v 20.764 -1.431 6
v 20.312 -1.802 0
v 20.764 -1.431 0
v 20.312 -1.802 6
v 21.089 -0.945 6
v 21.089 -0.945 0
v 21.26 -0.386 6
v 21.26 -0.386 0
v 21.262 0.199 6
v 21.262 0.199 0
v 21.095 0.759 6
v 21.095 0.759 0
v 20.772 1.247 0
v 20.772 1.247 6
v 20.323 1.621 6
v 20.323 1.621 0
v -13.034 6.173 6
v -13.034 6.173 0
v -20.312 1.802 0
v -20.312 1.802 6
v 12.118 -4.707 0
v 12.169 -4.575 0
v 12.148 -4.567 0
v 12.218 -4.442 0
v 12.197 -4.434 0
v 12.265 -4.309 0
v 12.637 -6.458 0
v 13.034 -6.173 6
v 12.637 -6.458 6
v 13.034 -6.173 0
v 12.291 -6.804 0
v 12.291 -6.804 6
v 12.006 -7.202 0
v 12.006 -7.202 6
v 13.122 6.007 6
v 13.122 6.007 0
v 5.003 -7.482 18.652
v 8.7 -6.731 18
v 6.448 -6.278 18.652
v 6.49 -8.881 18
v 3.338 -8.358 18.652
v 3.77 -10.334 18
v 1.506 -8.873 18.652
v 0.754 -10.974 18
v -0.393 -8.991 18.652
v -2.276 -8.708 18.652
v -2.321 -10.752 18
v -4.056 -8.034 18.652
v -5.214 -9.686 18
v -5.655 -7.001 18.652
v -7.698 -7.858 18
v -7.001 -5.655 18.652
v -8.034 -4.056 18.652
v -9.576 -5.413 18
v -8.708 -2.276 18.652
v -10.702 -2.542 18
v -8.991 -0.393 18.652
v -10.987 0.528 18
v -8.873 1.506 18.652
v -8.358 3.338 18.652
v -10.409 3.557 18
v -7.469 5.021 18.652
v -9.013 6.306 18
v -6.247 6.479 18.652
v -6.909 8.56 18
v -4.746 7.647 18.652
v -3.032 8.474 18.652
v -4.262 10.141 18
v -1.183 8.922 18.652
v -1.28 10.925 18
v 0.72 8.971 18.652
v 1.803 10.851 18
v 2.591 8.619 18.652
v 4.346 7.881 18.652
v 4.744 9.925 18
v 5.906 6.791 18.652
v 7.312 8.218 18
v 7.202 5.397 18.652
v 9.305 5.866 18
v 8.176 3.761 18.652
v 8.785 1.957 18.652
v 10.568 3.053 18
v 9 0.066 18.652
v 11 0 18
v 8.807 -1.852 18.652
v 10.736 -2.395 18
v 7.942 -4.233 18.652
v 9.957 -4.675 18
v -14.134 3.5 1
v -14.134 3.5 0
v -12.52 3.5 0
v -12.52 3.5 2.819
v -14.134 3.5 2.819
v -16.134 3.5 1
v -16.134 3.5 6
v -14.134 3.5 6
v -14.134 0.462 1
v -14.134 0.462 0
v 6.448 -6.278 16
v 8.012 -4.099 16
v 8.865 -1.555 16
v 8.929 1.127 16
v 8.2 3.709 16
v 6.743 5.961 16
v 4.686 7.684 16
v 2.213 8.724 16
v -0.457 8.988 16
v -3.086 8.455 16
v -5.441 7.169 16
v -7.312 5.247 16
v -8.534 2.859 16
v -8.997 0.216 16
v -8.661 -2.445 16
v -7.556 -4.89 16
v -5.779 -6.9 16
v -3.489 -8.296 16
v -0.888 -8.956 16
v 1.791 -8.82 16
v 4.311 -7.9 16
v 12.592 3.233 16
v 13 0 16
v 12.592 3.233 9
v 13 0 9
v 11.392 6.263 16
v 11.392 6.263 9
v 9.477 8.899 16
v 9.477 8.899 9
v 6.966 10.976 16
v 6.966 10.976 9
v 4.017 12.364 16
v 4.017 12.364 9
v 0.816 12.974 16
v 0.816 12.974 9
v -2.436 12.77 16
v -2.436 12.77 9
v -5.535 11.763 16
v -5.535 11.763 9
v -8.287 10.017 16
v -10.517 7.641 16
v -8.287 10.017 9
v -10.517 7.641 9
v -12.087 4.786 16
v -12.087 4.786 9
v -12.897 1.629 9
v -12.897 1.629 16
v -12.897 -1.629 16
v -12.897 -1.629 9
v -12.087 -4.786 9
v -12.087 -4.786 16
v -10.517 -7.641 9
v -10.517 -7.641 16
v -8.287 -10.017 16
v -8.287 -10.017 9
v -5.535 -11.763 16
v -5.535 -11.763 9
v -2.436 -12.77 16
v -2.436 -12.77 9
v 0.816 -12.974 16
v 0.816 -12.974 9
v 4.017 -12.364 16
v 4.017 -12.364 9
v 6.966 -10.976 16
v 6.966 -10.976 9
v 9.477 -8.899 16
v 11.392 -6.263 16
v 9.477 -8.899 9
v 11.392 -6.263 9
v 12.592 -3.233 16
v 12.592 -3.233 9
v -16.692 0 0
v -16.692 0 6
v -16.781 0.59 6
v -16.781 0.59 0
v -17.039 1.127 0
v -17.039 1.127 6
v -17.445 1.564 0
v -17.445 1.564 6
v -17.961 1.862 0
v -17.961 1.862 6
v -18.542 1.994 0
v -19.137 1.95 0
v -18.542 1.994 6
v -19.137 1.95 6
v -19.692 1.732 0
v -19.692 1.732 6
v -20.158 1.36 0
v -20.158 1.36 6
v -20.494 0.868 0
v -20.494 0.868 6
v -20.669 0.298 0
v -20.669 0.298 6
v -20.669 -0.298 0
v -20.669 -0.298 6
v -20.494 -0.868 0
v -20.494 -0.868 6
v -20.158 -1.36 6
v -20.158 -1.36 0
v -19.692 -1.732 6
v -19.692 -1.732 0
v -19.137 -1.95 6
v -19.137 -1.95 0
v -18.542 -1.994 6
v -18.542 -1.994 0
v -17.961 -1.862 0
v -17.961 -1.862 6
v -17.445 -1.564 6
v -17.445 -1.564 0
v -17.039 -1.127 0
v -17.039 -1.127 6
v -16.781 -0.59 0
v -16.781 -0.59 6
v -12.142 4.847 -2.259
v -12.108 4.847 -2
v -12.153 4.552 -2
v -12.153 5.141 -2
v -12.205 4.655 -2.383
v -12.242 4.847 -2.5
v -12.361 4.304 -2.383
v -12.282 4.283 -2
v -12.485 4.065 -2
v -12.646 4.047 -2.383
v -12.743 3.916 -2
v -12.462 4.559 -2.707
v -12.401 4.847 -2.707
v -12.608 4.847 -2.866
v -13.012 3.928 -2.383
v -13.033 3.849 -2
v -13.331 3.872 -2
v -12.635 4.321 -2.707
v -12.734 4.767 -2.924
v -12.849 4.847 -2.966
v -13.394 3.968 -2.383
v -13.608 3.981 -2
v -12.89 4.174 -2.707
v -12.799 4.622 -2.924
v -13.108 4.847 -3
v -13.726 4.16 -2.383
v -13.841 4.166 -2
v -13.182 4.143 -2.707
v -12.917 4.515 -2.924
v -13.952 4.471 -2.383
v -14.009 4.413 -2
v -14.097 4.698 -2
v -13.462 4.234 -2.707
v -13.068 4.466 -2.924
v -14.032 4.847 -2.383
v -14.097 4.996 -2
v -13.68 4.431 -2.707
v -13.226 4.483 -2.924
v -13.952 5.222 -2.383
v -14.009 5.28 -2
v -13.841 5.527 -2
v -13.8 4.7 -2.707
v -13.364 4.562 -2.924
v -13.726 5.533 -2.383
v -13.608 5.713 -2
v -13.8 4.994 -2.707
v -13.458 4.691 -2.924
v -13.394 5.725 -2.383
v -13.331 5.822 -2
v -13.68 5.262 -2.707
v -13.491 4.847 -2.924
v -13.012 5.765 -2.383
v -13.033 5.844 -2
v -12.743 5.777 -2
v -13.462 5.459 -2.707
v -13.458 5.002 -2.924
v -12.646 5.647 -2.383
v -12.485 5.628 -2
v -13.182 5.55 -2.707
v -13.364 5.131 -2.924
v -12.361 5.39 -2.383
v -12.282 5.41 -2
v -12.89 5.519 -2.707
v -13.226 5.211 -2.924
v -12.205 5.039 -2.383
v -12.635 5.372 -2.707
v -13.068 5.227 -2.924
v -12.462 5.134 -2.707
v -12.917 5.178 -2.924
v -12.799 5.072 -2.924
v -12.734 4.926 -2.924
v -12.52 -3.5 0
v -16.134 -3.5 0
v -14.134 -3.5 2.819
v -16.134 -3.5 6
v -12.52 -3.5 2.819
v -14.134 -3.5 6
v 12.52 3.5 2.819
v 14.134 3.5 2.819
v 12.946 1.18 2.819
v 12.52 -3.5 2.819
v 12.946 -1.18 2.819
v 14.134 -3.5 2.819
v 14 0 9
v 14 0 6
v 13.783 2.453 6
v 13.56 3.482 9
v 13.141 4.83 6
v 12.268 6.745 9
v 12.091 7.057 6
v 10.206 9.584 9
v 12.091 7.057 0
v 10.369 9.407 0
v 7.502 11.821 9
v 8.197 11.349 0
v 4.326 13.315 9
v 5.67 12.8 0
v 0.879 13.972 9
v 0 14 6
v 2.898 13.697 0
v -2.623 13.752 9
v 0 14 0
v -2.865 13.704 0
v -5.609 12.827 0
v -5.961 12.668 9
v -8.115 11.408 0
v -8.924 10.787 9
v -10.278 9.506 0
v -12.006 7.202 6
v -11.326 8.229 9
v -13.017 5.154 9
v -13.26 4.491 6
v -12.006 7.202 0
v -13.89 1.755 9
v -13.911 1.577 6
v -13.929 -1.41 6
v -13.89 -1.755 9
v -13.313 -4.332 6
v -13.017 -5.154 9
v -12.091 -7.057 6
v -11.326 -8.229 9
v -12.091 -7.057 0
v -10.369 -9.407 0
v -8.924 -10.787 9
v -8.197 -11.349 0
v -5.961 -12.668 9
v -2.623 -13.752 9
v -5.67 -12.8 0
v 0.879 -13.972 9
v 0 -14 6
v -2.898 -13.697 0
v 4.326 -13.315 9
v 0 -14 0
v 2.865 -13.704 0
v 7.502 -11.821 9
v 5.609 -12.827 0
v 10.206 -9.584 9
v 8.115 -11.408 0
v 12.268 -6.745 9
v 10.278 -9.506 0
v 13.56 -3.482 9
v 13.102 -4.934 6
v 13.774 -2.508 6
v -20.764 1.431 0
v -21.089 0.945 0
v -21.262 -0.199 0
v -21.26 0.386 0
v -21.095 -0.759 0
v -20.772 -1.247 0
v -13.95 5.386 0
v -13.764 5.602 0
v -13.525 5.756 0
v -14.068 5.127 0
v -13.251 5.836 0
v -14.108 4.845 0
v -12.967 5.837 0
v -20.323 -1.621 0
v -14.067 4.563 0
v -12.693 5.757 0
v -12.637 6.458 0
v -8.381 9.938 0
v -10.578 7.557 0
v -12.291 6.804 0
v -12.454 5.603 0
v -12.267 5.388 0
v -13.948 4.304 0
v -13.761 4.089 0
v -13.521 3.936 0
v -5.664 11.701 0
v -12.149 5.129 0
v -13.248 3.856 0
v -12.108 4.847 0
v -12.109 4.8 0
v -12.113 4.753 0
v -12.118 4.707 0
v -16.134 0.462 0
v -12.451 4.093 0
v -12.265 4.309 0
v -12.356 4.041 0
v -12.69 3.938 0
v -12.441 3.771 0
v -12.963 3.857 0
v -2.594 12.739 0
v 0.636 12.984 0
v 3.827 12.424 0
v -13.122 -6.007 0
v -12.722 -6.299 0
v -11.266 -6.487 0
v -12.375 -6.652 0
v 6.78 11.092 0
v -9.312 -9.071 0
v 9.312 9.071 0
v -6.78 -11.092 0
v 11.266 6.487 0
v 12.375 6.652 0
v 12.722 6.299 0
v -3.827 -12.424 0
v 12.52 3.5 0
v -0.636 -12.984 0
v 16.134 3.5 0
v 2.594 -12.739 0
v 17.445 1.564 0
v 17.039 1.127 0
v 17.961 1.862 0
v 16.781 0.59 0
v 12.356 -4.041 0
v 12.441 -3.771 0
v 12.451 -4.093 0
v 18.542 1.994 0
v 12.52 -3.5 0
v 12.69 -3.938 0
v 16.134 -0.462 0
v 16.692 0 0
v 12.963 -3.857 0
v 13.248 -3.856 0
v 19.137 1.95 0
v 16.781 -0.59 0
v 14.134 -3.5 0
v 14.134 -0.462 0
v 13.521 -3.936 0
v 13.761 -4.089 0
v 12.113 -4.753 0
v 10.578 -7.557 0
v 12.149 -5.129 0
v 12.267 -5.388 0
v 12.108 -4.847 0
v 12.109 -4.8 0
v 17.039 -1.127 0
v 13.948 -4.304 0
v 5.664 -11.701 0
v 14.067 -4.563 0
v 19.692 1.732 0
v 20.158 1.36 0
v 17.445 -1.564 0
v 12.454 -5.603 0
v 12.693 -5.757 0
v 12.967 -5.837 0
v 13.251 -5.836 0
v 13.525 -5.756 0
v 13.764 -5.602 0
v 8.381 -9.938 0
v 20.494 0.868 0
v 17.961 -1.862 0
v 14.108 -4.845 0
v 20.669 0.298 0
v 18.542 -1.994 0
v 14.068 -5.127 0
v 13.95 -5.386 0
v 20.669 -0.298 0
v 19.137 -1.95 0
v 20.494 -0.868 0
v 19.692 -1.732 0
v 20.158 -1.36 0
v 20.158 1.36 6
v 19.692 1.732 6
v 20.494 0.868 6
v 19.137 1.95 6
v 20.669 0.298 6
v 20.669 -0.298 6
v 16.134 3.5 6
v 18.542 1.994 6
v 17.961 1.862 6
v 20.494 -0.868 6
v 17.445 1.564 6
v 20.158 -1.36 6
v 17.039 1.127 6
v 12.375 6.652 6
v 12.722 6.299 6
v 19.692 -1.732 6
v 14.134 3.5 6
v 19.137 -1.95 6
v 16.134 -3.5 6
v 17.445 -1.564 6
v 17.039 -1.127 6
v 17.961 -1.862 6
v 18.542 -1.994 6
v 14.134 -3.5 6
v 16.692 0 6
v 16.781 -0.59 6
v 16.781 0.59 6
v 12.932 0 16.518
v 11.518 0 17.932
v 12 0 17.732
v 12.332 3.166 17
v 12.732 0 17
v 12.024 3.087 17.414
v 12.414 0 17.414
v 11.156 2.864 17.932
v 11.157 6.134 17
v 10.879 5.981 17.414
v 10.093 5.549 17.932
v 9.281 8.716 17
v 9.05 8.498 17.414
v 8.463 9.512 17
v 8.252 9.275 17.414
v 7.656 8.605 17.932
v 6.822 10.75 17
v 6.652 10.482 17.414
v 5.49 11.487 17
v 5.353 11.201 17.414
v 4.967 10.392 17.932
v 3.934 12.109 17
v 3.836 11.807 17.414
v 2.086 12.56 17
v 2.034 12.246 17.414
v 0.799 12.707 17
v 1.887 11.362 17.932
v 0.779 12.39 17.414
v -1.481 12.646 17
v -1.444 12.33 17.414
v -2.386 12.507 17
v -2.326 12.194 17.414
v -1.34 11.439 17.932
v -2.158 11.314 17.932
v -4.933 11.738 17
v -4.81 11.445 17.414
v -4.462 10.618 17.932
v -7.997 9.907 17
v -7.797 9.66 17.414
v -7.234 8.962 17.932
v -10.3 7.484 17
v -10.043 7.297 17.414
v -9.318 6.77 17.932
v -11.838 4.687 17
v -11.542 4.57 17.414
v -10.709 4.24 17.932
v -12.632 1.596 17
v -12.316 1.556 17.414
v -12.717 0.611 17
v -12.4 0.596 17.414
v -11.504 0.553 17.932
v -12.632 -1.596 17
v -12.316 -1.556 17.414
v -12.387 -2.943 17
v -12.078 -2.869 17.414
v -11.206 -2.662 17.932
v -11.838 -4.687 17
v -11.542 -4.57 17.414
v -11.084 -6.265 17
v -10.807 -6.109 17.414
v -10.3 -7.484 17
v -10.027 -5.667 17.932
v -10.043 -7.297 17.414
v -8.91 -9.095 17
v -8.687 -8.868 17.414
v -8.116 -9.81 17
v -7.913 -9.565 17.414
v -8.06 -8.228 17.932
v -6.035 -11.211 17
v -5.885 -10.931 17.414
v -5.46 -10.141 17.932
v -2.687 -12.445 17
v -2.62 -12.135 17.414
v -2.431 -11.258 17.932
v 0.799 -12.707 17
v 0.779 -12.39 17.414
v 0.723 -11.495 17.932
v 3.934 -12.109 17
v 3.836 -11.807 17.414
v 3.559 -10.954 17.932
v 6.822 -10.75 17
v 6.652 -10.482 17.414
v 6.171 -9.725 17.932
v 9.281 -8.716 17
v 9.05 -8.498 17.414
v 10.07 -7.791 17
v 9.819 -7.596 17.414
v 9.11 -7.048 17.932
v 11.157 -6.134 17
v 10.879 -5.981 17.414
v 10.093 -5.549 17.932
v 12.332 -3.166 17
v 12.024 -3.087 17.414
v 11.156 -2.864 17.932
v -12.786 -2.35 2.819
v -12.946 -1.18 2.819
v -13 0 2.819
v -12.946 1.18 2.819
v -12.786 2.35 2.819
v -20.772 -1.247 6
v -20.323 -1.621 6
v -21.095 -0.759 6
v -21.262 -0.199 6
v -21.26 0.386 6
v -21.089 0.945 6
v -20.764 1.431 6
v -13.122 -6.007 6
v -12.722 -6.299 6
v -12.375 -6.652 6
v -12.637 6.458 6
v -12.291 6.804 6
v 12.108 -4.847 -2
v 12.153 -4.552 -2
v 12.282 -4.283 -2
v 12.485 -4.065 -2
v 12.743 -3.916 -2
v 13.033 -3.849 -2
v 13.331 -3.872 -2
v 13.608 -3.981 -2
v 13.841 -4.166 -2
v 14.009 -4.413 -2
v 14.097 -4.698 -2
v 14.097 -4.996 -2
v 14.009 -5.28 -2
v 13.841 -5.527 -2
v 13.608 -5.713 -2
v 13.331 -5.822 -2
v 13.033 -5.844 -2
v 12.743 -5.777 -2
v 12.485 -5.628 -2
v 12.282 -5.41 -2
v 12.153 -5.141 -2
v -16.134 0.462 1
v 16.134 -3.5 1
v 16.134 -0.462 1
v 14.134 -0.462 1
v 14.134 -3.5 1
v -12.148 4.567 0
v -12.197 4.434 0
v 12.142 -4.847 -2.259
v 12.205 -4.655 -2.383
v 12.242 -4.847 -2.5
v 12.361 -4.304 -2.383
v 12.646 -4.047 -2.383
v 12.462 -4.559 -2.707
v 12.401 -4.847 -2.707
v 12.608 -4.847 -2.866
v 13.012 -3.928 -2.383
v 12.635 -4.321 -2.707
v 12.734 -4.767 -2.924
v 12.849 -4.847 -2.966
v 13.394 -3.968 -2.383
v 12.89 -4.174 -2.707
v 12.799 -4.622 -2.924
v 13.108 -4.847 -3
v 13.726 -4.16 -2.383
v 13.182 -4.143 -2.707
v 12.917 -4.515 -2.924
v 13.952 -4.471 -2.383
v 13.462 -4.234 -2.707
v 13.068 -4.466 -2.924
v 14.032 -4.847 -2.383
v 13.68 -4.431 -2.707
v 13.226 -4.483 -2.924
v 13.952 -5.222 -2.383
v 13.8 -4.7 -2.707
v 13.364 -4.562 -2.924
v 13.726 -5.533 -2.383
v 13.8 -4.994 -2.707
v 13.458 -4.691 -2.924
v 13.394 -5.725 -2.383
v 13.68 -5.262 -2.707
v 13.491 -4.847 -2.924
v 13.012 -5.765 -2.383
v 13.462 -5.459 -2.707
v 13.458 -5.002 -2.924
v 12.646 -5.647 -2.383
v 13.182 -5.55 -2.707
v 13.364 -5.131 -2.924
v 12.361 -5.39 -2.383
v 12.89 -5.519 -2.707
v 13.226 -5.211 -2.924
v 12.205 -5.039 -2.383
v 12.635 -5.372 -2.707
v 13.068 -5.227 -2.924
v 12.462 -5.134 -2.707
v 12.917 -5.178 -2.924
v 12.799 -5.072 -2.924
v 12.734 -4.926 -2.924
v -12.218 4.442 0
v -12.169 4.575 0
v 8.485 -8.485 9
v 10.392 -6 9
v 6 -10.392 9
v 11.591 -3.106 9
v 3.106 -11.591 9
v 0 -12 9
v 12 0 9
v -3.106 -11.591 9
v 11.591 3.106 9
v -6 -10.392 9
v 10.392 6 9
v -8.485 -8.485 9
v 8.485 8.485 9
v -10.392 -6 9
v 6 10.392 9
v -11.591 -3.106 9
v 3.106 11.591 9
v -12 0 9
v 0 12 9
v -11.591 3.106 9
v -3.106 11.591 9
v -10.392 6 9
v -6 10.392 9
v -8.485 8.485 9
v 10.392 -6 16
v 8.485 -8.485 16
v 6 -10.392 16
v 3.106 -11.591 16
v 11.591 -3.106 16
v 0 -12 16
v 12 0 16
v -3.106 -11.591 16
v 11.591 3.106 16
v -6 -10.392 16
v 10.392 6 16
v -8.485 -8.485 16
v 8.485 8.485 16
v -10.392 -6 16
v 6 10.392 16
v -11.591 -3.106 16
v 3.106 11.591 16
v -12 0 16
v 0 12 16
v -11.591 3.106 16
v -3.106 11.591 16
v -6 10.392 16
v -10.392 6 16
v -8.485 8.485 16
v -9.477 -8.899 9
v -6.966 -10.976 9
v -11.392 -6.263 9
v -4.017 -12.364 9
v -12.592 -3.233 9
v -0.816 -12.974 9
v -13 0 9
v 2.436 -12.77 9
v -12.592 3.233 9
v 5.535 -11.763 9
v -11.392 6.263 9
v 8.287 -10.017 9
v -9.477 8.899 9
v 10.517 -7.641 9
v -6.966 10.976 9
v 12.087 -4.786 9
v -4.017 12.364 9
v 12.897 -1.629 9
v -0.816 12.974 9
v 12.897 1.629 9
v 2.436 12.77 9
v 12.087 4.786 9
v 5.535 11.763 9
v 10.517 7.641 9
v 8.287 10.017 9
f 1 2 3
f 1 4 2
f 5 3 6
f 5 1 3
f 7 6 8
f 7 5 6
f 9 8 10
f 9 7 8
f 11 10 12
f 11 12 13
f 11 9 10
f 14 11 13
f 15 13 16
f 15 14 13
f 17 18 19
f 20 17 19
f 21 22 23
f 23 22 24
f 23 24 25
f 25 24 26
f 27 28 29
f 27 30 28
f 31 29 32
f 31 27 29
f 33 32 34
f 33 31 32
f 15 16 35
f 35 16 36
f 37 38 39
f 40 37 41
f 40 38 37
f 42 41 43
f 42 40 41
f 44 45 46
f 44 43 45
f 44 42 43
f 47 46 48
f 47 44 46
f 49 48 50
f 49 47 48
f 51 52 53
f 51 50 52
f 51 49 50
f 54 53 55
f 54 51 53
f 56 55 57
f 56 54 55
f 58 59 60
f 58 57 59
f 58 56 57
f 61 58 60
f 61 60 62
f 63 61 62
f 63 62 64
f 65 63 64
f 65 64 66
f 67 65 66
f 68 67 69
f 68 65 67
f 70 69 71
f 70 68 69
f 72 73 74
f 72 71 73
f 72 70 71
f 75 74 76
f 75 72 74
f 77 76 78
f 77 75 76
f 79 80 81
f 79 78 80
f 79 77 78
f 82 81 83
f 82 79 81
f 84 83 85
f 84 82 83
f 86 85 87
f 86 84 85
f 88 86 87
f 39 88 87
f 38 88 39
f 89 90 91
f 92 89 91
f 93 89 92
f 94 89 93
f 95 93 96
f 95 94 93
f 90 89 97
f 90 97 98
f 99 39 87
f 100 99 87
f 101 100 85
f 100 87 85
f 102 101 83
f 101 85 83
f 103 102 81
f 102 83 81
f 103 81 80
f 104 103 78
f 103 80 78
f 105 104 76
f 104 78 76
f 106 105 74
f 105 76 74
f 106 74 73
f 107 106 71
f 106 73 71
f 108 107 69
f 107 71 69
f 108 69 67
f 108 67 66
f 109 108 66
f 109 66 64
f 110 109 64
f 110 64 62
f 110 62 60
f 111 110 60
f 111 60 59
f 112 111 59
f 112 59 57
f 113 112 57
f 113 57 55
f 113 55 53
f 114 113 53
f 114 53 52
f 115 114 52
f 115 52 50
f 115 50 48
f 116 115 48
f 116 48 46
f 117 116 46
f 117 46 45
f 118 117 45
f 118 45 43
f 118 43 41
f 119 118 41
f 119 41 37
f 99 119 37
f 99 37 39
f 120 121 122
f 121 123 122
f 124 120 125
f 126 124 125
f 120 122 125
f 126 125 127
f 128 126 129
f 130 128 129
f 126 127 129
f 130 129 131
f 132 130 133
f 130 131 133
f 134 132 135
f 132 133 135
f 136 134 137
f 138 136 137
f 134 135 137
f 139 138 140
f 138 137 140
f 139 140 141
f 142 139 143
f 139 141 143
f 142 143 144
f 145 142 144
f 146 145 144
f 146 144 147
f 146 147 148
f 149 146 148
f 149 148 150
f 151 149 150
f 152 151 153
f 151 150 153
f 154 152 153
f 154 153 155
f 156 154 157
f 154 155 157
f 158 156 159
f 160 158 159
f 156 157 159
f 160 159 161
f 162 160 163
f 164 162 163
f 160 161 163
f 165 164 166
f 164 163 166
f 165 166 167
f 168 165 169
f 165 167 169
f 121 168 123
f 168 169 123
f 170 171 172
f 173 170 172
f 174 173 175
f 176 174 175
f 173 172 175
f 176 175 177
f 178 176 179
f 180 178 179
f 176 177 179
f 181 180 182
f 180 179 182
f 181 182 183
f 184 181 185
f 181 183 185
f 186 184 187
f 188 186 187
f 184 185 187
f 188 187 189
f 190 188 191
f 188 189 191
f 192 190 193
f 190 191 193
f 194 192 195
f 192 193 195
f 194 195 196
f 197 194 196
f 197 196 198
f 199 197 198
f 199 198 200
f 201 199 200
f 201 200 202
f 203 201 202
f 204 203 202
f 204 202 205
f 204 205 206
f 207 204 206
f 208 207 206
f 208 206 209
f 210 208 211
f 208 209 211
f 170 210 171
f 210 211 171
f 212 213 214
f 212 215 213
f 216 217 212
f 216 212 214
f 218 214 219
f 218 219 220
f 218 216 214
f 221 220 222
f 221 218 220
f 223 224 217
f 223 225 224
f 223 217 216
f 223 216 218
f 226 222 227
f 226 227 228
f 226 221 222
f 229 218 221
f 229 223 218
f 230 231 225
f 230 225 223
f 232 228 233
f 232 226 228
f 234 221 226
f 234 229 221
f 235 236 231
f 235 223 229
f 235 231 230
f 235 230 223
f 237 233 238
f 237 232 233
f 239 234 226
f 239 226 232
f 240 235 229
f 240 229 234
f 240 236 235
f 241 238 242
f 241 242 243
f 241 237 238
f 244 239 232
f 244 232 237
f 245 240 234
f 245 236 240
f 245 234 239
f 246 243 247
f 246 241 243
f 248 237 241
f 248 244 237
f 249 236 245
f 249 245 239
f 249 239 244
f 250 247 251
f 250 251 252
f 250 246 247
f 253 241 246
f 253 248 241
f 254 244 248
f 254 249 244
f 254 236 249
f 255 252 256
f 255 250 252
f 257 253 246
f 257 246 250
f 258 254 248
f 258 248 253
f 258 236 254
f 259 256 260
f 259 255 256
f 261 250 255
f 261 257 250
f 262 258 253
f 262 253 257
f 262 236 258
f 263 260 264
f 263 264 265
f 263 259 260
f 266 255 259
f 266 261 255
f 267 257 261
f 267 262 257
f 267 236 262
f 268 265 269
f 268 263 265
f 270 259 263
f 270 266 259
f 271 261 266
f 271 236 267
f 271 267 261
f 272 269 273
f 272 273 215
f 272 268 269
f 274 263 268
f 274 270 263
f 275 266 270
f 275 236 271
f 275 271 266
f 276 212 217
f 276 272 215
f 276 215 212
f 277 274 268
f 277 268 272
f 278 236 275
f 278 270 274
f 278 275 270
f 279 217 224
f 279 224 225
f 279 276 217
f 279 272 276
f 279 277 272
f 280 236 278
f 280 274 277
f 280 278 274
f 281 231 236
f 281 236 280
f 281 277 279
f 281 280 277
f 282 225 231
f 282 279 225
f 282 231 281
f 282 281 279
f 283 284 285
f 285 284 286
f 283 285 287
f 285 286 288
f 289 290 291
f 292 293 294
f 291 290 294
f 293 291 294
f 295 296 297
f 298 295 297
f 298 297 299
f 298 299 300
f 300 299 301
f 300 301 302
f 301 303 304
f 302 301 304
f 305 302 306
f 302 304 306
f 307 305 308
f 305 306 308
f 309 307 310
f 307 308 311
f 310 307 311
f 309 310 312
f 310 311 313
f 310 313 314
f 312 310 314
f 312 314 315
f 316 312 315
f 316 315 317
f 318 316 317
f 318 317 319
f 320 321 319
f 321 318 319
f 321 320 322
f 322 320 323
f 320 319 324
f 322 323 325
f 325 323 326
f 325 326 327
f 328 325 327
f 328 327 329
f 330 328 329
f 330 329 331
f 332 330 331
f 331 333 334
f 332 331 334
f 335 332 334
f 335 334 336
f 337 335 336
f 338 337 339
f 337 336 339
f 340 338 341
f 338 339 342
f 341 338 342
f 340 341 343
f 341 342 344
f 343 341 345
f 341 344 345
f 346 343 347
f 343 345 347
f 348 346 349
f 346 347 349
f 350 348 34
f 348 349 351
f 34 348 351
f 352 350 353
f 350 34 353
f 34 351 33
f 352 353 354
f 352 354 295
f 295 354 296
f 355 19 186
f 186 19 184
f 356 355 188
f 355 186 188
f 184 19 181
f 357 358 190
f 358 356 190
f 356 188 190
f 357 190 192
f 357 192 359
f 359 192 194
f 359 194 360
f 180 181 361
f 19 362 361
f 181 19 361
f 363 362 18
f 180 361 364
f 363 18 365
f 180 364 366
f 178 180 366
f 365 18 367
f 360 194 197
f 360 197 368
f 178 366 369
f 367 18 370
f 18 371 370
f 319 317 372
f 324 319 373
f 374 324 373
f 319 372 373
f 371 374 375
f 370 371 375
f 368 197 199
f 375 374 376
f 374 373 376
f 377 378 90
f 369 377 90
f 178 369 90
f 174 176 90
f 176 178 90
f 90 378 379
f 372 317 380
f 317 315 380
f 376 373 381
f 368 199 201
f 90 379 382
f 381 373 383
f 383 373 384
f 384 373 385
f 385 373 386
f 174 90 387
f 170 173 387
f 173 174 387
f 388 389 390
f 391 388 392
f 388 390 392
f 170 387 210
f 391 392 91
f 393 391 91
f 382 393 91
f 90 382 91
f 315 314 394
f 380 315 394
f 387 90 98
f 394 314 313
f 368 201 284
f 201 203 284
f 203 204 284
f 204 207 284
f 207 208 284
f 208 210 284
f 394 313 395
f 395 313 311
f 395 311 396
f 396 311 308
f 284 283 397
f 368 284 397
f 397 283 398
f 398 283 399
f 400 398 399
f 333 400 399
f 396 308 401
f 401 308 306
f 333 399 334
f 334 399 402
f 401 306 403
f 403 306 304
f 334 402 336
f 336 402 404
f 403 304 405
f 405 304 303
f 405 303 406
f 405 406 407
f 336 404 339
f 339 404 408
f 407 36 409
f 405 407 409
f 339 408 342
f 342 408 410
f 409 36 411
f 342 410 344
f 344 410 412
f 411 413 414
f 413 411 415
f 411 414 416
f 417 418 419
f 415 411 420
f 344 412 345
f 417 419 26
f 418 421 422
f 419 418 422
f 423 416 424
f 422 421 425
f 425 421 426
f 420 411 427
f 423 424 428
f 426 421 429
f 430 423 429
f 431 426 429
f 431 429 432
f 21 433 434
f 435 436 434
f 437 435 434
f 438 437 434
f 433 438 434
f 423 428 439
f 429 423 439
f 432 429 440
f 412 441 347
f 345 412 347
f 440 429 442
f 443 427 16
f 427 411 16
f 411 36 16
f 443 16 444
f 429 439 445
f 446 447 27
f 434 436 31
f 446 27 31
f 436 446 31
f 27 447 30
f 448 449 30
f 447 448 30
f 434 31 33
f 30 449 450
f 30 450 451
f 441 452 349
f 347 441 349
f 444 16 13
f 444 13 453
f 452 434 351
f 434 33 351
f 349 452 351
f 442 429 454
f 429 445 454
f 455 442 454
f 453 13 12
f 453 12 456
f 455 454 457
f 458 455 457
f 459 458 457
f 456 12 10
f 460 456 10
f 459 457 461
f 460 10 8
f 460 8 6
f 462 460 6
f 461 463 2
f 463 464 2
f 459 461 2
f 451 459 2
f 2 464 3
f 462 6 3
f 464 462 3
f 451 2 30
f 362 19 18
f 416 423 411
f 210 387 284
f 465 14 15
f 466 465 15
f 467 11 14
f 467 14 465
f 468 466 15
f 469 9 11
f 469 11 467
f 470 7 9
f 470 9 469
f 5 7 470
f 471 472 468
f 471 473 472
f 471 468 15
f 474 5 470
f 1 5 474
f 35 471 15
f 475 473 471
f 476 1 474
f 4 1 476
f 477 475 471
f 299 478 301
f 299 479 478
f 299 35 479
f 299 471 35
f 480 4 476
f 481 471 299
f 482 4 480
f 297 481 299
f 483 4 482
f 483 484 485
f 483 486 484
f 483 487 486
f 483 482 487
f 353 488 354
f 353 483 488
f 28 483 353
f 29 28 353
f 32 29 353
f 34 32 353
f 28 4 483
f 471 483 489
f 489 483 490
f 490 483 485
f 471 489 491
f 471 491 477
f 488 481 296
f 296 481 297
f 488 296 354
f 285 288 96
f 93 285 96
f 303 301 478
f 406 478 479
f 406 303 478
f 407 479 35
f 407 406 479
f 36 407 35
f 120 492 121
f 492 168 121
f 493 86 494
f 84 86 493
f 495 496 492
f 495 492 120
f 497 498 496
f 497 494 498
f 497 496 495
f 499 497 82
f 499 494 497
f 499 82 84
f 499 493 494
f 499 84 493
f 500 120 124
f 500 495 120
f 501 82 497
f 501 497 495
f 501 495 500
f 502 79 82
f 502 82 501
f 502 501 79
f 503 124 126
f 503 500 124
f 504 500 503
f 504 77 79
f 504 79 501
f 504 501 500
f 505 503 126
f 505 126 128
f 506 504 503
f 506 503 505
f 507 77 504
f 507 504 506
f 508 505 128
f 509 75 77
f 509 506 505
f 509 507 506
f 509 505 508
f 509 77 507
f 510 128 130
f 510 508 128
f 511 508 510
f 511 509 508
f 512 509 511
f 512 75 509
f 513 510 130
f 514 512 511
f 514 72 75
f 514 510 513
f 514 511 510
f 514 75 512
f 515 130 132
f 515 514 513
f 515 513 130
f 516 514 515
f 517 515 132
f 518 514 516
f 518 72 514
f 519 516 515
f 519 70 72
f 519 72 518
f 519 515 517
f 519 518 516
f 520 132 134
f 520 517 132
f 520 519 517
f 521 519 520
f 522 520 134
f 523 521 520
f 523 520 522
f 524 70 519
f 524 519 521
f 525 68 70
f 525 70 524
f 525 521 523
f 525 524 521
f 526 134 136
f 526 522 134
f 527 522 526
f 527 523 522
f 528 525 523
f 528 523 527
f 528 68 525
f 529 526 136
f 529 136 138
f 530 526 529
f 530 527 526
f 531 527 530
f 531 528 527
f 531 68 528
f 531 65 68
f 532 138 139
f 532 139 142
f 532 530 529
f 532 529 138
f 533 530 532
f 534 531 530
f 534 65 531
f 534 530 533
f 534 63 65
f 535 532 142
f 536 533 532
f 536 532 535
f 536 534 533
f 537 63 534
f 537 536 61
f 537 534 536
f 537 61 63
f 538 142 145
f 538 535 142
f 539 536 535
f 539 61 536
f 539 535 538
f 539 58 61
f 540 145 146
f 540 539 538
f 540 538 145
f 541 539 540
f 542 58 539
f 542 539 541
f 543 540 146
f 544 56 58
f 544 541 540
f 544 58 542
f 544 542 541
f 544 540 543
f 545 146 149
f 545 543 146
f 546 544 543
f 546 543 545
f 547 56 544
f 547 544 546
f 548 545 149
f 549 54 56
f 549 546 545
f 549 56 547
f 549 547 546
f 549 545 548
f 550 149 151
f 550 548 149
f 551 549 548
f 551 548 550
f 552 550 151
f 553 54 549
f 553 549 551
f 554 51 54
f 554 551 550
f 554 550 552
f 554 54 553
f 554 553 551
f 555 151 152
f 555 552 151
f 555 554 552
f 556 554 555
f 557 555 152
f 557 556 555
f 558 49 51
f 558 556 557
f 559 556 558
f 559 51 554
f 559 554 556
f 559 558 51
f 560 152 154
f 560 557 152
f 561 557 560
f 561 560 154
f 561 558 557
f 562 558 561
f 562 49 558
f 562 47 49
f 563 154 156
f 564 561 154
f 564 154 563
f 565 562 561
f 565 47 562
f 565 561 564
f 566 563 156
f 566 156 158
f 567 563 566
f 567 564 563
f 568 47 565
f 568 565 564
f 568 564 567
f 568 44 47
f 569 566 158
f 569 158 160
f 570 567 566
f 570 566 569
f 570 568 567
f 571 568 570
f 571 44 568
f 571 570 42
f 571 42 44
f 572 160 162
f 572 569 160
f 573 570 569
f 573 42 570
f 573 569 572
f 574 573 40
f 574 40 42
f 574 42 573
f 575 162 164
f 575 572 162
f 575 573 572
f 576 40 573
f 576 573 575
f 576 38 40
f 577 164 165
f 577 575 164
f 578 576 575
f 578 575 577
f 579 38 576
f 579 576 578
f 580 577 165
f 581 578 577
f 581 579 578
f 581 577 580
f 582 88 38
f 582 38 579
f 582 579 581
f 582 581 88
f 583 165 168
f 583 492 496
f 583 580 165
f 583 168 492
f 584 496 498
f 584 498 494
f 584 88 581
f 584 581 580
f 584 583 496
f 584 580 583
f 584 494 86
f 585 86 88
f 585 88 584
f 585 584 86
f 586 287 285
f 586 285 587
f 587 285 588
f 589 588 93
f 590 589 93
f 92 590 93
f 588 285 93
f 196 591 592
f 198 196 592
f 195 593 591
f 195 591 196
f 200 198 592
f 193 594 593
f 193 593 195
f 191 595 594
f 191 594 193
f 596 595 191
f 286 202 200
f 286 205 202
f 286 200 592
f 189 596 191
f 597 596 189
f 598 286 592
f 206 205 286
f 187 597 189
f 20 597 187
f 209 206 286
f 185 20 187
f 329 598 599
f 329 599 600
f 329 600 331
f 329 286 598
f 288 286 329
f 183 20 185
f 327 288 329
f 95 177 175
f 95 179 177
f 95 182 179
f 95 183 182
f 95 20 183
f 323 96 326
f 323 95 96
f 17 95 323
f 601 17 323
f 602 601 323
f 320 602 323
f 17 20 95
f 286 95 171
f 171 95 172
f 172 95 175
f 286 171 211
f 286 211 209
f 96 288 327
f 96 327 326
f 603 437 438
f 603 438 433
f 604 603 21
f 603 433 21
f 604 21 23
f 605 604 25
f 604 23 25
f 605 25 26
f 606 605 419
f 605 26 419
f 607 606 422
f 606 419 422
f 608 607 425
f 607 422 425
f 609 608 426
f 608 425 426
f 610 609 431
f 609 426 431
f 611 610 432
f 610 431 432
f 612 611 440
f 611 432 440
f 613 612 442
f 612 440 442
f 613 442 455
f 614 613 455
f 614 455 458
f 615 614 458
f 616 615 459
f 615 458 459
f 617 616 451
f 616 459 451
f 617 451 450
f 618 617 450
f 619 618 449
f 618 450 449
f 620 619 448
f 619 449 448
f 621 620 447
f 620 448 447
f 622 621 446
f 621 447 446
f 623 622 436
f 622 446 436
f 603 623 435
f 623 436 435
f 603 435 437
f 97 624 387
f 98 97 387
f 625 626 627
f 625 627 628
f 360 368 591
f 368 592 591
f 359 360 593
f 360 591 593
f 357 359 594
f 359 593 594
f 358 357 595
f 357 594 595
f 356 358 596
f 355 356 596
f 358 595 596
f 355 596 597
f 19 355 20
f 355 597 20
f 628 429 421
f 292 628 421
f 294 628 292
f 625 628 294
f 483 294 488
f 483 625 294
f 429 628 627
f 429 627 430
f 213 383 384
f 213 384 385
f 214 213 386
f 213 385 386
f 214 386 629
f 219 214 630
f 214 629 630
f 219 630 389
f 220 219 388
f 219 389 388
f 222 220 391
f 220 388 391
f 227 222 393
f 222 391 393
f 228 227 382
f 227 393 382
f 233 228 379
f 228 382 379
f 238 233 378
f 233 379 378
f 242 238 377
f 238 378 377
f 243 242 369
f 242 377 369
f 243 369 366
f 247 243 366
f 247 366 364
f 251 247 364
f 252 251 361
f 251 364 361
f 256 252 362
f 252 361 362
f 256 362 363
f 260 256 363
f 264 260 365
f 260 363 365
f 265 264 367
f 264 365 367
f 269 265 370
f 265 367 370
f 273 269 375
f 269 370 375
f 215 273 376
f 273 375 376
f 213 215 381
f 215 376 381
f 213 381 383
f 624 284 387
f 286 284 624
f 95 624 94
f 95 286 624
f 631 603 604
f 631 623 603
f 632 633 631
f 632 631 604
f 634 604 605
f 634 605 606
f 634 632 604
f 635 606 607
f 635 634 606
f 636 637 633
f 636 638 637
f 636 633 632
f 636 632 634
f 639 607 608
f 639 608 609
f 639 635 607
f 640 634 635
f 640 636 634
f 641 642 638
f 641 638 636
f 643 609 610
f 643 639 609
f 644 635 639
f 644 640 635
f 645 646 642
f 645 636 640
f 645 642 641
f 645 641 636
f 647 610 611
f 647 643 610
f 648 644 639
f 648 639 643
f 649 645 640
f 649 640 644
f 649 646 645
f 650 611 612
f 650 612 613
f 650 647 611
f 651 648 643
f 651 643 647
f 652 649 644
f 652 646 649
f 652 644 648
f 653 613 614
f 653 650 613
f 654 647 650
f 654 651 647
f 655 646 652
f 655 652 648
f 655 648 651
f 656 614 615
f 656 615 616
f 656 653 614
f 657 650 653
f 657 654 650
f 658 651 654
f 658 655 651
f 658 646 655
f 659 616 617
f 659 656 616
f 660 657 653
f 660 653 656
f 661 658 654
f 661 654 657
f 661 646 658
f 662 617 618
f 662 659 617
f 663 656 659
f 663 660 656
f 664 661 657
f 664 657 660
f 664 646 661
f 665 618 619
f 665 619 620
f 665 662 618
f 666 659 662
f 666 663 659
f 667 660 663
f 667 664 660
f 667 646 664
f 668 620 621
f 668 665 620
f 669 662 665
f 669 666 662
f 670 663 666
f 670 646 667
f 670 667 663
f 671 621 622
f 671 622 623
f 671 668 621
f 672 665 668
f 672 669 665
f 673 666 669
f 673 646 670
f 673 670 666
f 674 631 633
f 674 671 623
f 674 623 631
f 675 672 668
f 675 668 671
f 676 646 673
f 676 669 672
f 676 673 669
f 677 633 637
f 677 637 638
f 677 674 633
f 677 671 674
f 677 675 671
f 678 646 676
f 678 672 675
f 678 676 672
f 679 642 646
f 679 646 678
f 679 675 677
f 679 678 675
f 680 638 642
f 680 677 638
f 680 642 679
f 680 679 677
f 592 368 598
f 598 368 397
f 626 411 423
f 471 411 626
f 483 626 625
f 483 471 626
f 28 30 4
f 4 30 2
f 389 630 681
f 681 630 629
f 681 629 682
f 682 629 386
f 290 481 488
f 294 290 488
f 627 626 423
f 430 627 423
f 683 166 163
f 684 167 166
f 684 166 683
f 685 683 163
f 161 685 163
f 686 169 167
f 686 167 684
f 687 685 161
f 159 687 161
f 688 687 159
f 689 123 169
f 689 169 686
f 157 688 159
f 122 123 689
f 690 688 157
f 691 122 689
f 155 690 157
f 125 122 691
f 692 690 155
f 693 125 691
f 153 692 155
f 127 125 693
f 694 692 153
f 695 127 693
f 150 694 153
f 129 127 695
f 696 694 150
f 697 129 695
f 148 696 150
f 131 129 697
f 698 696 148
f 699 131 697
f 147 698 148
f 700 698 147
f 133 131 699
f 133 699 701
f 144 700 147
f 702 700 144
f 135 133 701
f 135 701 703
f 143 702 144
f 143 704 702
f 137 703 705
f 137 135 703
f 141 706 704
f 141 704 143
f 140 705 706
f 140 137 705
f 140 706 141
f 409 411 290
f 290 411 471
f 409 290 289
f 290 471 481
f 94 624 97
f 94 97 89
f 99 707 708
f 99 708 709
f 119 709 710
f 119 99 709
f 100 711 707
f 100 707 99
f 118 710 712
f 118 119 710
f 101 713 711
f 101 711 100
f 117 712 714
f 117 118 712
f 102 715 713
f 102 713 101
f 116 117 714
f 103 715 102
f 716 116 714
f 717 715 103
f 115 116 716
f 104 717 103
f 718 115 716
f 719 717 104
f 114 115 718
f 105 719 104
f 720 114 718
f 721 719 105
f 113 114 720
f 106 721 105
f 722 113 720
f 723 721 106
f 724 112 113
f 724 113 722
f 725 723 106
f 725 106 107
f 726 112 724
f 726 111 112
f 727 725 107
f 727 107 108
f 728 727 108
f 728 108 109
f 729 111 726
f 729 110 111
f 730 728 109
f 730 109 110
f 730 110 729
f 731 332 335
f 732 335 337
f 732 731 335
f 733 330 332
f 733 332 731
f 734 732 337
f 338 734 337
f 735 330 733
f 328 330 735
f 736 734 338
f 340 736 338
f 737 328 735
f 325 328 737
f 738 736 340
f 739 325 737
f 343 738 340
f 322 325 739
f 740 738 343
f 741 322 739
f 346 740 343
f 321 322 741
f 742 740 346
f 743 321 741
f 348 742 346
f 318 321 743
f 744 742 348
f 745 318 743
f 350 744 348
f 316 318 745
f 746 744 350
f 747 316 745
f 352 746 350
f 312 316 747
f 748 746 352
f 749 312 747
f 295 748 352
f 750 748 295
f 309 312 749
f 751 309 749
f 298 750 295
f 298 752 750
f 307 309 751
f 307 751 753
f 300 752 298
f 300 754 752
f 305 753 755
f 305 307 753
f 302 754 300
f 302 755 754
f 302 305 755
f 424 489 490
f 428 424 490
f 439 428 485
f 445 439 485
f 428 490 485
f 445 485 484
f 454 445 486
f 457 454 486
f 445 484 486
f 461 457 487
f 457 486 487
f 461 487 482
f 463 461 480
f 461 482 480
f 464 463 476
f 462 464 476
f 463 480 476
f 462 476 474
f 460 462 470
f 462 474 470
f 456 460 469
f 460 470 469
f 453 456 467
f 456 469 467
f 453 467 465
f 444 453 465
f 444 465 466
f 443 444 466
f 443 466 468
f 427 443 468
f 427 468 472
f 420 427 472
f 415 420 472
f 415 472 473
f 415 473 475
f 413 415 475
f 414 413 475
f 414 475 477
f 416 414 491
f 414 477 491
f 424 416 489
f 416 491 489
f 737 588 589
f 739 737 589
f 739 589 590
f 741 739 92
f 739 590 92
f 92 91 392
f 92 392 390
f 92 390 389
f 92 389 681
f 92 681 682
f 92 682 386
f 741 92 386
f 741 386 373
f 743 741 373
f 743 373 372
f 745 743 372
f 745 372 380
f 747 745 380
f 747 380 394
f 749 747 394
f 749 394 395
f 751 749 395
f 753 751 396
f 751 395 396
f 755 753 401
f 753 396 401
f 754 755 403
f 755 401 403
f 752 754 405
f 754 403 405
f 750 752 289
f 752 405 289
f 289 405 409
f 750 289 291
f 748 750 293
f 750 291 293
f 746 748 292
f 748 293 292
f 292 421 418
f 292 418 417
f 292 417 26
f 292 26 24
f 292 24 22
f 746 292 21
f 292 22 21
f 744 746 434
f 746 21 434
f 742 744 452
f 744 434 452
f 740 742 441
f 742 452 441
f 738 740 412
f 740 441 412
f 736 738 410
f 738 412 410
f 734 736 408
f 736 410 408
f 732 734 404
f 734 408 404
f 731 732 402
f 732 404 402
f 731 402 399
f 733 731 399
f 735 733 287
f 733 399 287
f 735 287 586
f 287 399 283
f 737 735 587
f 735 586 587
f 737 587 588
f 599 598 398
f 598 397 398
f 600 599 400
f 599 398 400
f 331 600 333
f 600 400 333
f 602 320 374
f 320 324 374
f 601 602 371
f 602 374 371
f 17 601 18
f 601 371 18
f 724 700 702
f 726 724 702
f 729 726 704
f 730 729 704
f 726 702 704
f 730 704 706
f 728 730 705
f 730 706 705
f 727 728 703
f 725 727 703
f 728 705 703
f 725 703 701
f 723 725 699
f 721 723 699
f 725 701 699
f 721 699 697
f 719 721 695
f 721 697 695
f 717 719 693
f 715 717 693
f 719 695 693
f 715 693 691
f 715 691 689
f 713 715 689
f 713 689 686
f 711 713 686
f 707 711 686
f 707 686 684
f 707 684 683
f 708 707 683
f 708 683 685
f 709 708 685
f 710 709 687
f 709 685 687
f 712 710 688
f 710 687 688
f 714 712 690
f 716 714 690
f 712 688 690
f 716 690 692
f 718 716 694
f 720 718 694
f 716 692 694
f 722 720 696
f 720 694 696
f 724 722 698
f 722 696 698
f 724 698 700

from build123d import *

# Parameters (mm, degrees)
SKETCH1_R                = 14
BOSS_EXTRUDE1_DEPTH      = 9
SKETCH2_R                = 13
BOSS_EXTRUDE2_DEPTH      = 9
FILLET1_R                = 2
SKETCH3_R                = 8
BOSS_EXTRUDE4_DEPTH      = 1
BOSS_EXTRUDE5_DEPTH      = 6
SKETCH6_R                = 2
CUT_EXTRUDE1_DEPTH       = 6
FILLET2_R                = 2
SKETCH7_W                = 2
SKETCH7_H                = 7
CUT_EXTRUDE2_DEPTH       = 6
SKETCH9_R                = 1
BOSS_EXTRUDE7_DEPTH      = 3
FILLET5_R                = 1
FILLET6_R                = 3
SKETCH18_W               = 3.964192534
SKETCH18_H               = 7
CUT_EXTRUDE3_DEPTH       = 3
SKETCH19_W               = 1
SKETCH19_H               = 3.03788609
BOSS_EXTRUDE8_DEPTH      = 2
CIRPATTERN2_COUNT        = 2
FILLET2_OF_CIRPATTERN2_R = 2
FILLET5_OF_CIRPATTERN2_R = 1
FILLET6_OF_CIRPATTERN2_R = 3
SKETCH10_R               = 13
CUT_EXTRUDE4_DEPTH       = 9
SKETCH20_R               = 12
CUT_EXTRUDE6_DEPTH       = 7
SKETCH17_R               = 9
CUT_EXTRUDE7_DEPTH       = 7


with BuildPart() as part:
    # Sketch1 → Boss-Extrude1 (new body)
    with BuildSketch(Plane.XY):
        Circle(SKETCH1_R)
    extrude(amount=BOSS_EXTRUDE1_DEPTH)

    # Sketch2 → Boss-Extrude2 (add)
    with BuildSketch(Plane.XY.offset(9)):
        Circle(SKETCH2_R)
    extrude(amount=BOSS_EXTRUDE2_DEPTH)

    # Fillet1
    fillet1_edges = [part.edges().sort_by_distance(p)[0] for p in [
        (-13, 0, 18),
    ]]
    fillet(fillet1_edges, radius=FILLET1_R)

    # Sketch3 → Boss-Extrude4 (add)
    with BuildSketch(Plane.XY.offset(18)):
        Circle(SKETCH3_R)
    extrude(amount=BOSS_EXTRUDE4_DEPTH)

    # Loft2: read off the stored shape, not the designer's step
    # Loft2: loft between two sections, ruled curve by curve
    loft2_from = [
        Edge.make_bspline([(5.248893728, -6.037310215, 19), (-6.825726701, -16.535097672, 19), (-17.323514158, -4.460477242, 19), (-5.248893728, 6.037310215, 19), (6.825726701, 16.535097672, 19), (17.323514158, 4.460477242, 19), (5.248893728, -6.037310215, 19)], [0, 0, 0, 0, 0.5, 0.5, 0.5, 1, 1, 1, 1], 3, [1, 0.333333333, 0.333333333, 1, 0.333333333, 0.333333333, 1]),
    ]
    loft2_to = [
        Edge.make_bspline([(8.70017049, -6.731049951, 18), (-4.761929412, -24.131390931, 18), (-22.162270392, -10.669291029, 18), (-8.70017049, 6.731049951, 18), (4.761929412, 24.131390931, 18), (22.162270392, 10.669291029, 18), (8.70017049, -6.731049951, 18)], [0, 0, 0, 0, 0.5, 0.5, 0.5, 1, 1, 1, 1], 3, [1, 0.333333333, 0.333333333, 1, 0.333333333, 0.333333333, 1]),
    ]
    loft2 = Solid(Shell([*[Face.make_surface_from_curves(loft2_from[k], loft2_to[k]) for k in range(1)], Face(Wire(loft2_from)), Face(Wire(loft2_to))]))
    add(loft2)

    # Sketch5 → Boss-Extrude5 (add)
    with BuildSketch(Plane.XY):
        Polygon((0, 14), (-23.146959422, 0.099702538), (0, -14), align=None)
    boss_extrude5 = extrude(amount=BOSS_EXTRUDE5_DEPTH)

    # Sketch6 → Cut-Extrude1 (cut)
    with BuildSketch(Plane.XY.offset(6)):
        with Locations((-18.691655648, 0)):
            Circle(SKETCH6_R)
    cut_extrude1 = extrude(amount=-CUT_EXTRUDE1_DEPTH, mode=Mode.SUBTRACT)

    # Fillet2
    fillet2_edges = [part.edges().sort_by_distance(p)[0] for p in [
        (-23.146959422, 0.099702538, 3),
    ]]
    fillet(fillet2_edges, radius=FILLET2_R)

    # Sketch7 → Cut-Extrude2 (cut)
    with BuildSketch(Plane.XY.offset(6)):
        with Locations((-15.134010952, 0)):
            Rectangle(SKETCH7_W, SKETCH7_H)
    cut_extrude2 = extrude(amount=-CUT_EXTRUDE2_DEPTH, mode=Mode.SUBTRACT)

    # Sketch9 → Boss-Extrude7 (add)
    with BuildSketch(Plane(origin=(0, 0, 0), x_dir=(-1, 0, 0), z_dir=(0, 0, -1))):
        with Locations(Location((13.108195975, 4.846616093, 0), (0, 0, 180))):
            Circle(SKETCH9_R)
    boss_extrude7 = extrude(amount=BOSS_EXTRUDE7_DEPTH)

    # Fillet5
    fillet5_edges = [part.edges().sort_by_distance(p)[0] for p in [
        (-14.108195975, 4.846616093, -3),
    ]]
    fillet(fillet5_edges, radius=FILLET5_R)

    # Fillet6
    fillet6_edges = [part.edges().sort_by_distance(p)[0] for p in [
        (-12.358010146, 6.578722158, 3),
        (-12.440013632, -6.422309618, 3),
    ]]
    fillet(fillet6_edges, radius=FILLET6_R)

    # Sketch18 → Cut-Extrude3 (cut)
    with BuildSketch(Plane.ZY.offset(14.134010952)):
        with Locations((0.837060151, 0)):
            Rectangle(SKETCH18_W, SKETCH18_H)
    cut_extrude3 = extrude(amount=-CUT_EXTRUDE3_DEPTH, mode=Mode.SUBTRACT)

    # Sketch19 → Boss-Extrude8 (add)
    with BuildSketch(Plane(origin=(-16.134010952, 0, 0), x_dir=(0, 0, -1), z_dir=(1, 0, 0))):
        with Locations((-0.5, 1.981056955)):
            Rectangle(SKETCH19_W, SKETCH19_H)
    boss_extrude8 = extrude(amount=BOSS_EXTRUDE8_DEPTH)

    # CirPattern2: Boss-Extrude5, Cut-Extrude1, Cut-Extrude2, Boss-Extrude7, Cut-Extrude3, Boss-Extrude8 ×2 about axis
    cirpattern2_axis = Axis((0, 0, 0), (0, 0, 1))
    add([boss_extrude5.rotate(cirpattern2_axis, i * 360 / CIRPATTERN2_COUNT) for i in range(1, CIRPATTERN2_COUNT)])
    add([cut_extrude1.rotate(cirpattern2_axis, i * 360 / CIRPATTERN2_COUNT) for i in range(1, CIRPATTERN2_COUNT)], mode=Mode.SUBTRACT)
    add([cut_extrude2.rotate(cirpattern2_axis, i * 360 / CIRPATTERN2_COUNT) for i in range(1, CIRPATTERN2_COUNT)], mode=Mode.SUBTRACT)
    add([boss_extrude7.rotate(cirpattern2_axis, i * 360 / CIRPATTERN2_COUNT) for i in range(1, CIRPATTERN2_COUNT)])
    add([cut_extrude3.rotate(cirpattern2_axis, i * 360 / CIRPATTERN2_COUNT) for i in range(1, CIRPATTERN2_COUNT)], mode=Mode.SUBTRACT)
    add([boss_extrude8.rotate(cirpattern2_axis, i * 360 / CIRPATTERN2_COUNT) for i in range(1, CIRPATTERN2_COUNT)])

    # Fillet2 of CirPattern2
    fillet2_of_cirpattern2_edges = [part.edges().sort_by_distance(p)[0] for p in [
        (23.146959422, -0.099702538, 3),
    ]]
    fillet(fillet2_of_cirpattern2_edges, radius=FILLET2_OF_CIRPATTERN2_R)

    # Fillet5 of CirPattern2
    fillet5_of_cirpattern2_edges = [part.edges().sort_by_distance(p)[0] for p in [
        (14.108195975, -4.846616093, -3),
    ]]
    fillet(fillet5_of_cirpattern2_edges, radius=FILLET5_OF_CIRPATTERN2_R)

    # Fillet6 of CirPattern2
    fillet6_of_cirpattern2_edges = [part.edges().sort_by_distance(p)[0] for p in [
        (12.358010146, -6.578722158, 3),
        (12.440013632, 6.422309618, 3),
    ]]
    fillet(fillet6_of_cirpattern2_edges, radius=FILLET6_OF_CIRPATTERN2_R)

    # Sketch10 → Cut-Extrude4 (cut)
    with BuildSketch(Plane(origin=(0, 0, 0), x_dir=(-1, 0, 0), z_dir=(0, 0, -1))):
        Circle(SKETCH10_R)
    extrude(amount=-CUT_EXTRUDE4_DEPTH, mode=Mode.SUBTRACT)


with BuildPart() as cut_extrude4_piece_1:
    # of the separate pieces the step leaves, piece 1, a body of its own (cut_extrude4_pieces)
    add(part.part.solids().sort_by_distance((13, 0, 16))[0])

    # Sketch20 → Cut-Extrude6 (cut)
    with BuildSketch(Plane(origin=(0, 0, 9), x_dir=(-1, 0, 0), z_dir=(0, 0, -1))):
        Circle(SKETCH20_R)
    extrude(amount=-CUT_EXTRUDE6_DEPTH, mode=Mode.SUBTRACT)

    # Sketch17 → Cut-Extrude7 (cut)
    with BuildSketch(Plane.XY.offset(19)):
        with Locations(Location((0, 0, 0), (0, 0, 315.765085114))):
            Circle(SKETCH17_R)
    extrude(amount=-CUT_EXTRUDE7_DEPTH, mode=Mode.SUBTRACT)


with BuildPart() as cut_extrude4_piece_2:
    # of the separate pieces the step leaves, piece 2, a body of its own (cut_extrude4_pieces)
    add(part.part.solids().sort_by_distance((13.033943153, -6.172808375, 0))[0])


solid = Compound([cut_extrude4_piece_1.part, cut_extrude4_piece_2.part])
